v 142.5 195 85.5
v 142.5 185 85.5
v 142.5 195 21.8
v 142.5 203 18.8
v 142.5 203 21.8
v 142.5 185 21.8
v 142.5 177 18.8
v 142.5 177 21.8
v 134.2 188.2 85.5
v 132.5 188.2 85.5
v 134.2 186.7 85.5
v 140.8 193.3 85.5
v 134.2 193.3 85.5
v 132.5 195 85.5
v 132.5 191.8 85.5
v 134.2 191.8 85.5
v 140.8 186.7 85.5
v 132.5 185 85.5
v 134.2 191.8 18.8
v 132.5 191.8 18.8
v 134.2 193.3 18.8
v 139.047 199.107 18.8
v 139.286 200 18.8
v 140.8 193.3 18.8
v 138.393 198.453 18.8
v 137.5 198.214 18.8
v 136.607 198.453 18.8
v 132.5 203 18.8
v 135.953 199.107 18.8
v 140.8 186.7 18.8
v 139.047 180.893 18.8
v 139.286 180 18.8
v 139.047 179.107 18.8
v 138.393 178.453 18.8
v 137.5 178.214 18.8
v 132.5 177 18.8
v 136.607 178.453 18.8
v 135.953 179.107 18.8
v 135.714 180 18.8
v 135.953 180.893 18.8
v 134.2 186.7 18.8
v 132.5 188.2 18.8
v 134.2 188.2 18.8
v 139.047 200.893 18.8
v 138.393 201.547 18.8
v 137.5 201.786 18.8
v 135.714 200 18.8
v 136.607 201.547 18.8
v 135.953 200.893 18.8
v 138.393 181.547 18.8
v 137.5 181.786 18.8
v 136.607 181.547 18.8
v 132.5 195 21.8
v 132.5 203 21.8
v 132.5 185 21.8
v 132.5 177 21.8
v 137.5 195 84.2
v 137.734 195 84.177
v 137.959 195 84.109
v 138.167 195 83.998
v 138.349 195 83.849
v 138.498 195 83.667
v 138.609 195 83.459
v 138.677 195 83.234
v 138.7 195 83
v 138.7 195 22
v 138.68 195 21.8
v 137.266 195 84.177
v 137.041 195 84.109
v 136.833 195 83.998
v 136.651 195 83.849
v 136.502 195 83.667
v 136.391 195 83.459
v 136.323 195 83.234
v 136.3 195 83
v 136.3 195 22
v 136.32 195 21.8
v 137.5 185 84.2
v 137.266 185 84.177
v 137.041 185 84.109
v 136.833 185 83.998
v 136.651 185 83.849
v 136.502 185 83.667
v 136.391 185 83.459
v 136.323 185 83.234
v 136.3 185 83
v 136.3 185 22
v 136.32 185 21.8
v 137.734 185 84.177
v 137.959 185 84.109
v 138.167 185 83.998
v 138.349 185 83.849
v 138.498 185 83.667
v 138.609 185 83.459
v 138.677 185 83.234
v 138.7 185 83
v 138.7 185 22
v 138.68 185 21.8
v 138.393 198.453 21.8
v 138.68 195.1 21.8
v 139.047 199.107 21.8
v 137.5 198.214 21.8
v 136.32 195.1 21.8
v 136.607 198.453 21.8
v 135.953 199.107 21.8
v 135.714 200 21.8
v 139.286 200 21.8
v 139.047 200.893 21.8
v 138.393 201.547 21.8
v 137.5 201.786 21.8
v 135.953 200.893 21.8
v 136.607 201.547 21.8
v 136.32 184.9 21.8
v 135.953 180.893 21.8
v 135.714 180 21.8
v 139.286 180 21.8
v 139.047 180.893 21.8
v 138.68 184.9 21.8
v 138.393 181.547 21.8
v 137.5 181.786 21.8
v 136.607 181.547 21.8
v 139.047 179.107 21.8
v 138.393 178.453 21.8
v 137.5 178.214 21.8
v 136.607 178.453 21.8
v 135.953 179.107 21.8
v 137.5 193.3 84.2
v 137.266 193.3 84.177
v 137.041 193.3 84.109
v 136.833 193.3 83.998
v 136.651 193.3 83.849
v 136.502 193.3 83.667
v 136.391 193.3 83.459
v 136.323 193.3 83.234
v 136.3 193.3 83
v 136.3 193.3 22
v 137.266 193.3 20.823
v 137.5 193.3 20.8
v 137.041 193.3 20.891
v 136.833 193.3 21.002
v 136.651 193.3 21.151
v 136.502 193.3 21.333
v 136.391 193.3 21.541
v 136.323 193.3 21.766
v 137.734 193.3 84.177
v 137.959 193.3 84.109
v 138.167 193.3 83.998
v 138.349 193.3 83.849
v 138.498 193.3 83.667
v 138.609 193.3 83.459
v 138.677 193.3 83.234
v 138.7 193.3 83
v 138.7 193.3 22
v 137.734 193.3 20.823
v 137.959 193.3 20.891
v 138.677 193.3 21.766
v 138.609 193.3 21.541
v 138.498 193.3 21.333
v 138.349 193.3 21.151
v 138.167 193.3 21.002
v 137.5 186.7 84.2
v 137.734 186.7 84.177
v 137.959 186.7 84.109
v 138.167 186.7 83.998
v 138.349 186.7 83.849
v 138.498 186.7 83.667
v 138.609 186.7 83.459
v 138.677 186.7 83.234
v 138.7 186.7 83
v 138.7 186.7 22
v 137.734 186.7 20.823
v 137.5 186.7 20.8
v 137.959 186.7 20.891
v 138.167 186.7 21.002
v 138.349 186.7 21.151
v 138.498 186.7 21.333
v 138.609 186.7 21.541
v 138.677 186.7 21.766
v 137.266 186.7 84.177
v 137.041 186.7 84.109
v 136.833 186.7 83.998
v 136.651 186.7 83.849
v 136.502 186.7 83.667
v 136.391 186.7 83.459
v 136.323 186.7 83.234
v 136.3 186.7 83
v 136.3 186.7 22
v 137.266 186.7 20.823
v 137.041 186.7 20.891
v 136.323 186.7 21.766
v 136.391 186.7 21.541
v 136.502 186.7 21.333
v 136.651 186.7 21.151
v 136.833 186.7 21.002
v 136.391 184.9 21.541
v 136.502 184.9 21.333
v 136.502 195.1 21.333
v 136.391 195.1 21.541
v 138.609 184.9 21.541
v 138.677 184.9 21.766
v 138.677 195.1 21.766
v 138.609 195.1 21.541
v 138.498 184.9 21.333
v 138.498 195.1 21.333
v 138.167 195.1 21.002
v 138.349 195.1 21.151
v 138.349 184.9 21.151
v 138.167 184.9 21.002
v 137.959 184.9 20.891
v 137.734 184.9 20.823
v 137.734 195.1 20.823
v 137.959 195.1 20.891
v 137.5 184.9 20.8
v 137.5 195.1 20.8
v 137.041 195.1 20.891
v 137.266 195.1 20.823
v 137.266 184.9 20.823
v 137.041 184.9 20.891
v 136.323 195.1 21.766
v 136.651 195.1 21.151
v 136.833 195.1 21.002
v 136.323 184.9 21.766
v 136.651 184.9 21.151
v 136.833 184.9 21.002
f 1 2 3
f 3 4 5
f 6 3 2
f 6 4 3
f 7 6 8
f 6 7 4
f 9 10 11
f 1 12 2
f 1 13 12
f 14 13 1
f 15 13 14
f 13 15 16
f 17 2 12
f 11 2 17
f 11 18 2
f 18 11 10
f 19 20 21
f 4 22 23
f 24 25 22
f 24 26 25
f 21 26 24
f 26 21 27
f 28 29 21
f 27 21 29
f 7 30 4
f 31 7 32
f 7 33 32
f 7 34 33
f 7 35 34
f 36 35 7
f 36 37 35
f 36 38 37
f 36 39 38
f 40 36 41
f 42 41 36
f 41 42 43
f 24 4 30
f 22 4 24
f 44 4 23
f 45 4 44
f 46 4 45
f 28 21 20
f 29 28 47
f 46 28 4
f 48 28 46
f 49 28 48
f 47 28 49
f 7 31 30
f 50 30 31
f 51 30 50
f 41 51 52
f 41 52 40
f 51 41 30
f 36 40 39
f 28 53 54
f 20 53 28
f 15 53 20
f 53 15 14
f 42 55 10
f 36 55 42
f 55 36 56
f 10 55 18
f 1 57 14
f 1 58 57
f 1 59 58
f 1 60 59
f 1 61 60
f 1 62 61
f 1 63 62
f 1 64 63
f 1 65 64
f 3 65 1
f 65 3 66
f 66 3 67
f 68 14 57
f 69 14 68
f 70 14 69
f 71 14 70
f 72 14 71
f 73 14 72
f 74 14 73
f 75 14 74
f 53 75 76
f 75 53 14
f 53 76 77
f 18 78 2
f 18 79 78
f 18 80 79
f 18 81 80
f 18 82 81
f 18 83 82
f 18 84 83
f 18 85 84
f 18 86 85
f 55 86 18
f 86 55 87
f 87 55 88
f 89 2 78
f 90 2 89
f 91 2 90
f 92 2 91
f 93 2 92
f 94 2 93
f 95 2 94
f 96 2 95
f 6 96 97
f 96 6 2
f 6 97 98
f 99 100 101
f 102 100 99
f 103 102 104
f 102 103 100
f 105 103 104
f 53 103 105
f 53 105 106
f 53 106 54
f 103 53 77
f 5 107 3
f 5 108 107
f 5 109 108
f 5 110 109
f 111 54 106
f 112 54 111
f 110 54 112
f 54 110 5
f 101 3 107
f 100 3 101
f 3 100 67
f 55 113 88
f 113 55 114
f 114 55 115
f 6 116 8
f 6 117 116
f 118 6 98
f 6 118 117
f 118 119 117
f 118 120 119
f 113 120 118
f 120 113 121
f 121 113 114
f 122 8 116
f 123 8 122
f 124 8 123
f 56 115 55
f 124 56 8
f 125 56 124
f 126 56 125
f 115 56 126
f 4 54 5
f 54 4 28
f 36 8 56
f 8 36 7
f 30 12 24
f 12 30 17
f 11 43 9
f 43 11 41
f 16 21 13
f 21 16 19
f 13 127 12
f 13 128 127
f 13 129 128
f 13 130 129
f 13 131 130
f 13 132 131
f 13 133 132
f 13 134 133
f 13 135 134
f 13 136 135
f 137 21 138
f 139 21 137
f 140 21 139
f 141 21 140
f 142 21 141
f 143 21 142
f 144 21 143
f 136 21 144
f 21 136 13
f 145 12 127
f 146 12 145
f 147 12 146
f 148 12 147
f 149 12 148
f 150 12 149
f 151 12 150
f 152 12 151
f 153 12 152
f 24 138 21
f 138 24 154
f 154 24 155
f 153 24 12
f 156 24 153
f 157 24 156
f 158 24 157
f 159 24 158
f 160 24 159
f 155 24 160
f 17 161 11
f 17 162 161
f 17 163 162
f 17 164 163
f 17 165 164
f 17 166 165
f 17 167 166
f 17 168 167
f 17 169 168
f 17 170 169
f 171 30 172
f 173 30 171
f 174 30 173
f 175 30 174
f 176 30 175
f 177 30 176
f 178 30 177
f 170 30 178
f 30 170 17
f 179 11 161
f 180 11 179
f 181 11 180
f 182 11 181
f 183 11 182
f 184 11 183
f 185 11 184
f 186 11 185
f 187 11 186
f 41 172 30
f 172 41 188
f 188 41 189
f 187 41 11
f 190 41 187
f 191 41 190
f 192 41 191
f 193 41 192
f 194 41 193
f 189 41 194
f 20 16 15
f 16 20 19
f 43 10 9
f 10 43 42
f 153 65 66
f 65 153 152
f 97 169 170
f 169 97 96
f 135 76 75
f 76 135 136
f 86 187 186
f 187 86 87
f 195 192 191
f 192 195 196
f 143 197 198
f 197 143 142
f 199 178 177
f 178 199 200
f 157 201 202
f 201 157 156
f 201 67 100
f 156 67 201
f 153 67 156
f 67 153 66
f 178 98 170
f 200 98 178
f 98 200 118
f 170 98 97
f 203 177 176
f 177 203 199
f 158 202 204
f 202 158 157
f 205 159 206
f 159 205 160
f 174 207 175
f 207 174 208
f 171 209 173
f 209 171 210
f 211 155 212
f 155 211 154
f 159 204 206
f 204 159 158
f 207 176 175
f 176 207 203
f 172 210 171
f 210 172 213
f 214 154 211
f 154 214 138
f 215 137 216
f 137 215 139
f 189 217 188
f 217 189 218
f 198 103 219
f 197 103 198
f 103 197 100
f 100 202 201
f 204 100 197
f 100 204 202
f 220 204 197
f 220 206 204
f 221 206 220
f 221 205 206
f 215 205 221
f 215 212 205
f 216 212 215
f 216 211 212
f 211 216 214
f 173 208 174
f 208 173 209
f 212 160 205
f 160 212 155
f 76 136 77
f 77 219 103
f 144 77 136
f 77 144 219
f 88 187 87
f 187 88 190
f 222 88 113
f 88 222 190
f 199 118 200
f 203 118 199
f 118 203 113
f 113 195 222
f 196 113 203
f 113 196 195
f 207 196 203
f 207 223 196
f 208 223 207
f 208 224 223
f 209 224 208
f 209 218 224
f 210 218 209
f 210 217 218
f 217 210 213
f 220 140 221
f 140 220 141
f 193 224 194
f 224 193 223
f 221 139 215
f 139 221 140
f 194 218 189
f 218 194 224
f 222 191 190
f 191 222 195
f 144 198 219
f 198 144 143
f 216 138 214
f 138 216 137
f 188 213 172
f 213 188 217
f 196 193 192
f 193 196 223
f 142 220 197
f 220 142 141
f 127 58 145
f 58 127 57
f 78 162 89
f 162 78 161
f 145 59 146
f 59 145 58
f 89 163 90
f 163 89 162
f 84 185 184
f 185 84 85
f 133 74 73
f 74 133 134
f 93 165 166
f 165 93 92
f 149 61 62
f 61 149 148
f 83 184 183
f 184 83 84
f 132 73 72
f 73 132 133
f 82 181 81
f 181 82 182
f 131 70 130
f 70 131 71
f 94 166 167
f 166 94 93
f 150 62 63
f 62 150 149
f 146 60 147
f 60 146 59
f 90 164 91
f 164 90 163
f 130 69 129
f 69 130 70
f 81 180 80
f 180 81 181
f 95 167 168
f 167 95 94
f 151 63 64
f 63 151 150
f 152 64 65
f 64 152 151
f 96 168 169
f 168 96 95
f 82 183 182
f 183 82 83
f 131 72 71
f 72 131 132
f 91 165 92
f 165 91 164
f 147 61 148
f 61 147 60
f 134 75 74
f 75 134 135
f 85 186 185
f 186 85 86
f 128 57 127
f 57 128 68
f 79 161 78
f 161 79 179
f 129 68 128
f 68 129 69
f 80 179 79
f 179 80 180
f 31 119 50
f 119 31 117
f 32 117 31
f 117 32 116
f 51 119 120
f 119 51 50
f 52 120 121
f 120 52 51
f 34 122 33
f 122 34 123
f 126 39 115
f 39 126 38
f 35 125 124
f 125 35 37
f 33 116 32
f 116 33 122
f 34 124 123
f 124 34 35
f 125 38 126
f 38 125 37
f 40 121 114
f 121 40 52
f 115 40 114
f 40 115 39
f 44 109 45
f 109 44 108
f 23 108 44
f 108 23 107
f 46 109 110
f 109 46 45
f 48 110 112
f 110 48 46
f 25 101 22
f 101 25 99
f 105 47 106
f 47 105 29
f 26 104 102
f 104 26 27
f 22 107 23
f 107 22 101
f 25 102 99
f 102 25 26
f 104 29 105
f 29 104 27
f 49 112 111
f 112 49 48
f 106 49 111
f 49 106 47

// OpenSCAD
// Generated from the same CSG operations as STEP. Rebuild with spec/build_parent_hand_service.py.
difference(){difference(){difference(){difference(){difference(){difference(){difference(){union(){translate([132.5,185,18.8]) cube([10,10,66.7]);translate([132.5,177,18.8]) cube([10,26,3]);}translate([134.2,186.7,18.7]) cube([6.6,6.6,66.9]);}translate([132.4,188.2,18.7]) cube([5.1,3.6,67]);}translate([136.3,184.9,22]) cube([2.4,10.2,61]);}translate([137.5,184.9,22]) rotate([-90,0,0]) cylinder(r=1.2,h=10.2,$fn=32);}translate([137.5,184.9,83]) rotate([-90,0,0]) cylinder(r=1.2,h=10.2,$fn=32);}translate([137.5,180,18.7]) cylinder(r=1.7858514112073933,h=3.2,$fn=12);}translate([137.5,200,18.7]) cylinder(r=1.7858514112073933,h=3.2,$fn=12);}
